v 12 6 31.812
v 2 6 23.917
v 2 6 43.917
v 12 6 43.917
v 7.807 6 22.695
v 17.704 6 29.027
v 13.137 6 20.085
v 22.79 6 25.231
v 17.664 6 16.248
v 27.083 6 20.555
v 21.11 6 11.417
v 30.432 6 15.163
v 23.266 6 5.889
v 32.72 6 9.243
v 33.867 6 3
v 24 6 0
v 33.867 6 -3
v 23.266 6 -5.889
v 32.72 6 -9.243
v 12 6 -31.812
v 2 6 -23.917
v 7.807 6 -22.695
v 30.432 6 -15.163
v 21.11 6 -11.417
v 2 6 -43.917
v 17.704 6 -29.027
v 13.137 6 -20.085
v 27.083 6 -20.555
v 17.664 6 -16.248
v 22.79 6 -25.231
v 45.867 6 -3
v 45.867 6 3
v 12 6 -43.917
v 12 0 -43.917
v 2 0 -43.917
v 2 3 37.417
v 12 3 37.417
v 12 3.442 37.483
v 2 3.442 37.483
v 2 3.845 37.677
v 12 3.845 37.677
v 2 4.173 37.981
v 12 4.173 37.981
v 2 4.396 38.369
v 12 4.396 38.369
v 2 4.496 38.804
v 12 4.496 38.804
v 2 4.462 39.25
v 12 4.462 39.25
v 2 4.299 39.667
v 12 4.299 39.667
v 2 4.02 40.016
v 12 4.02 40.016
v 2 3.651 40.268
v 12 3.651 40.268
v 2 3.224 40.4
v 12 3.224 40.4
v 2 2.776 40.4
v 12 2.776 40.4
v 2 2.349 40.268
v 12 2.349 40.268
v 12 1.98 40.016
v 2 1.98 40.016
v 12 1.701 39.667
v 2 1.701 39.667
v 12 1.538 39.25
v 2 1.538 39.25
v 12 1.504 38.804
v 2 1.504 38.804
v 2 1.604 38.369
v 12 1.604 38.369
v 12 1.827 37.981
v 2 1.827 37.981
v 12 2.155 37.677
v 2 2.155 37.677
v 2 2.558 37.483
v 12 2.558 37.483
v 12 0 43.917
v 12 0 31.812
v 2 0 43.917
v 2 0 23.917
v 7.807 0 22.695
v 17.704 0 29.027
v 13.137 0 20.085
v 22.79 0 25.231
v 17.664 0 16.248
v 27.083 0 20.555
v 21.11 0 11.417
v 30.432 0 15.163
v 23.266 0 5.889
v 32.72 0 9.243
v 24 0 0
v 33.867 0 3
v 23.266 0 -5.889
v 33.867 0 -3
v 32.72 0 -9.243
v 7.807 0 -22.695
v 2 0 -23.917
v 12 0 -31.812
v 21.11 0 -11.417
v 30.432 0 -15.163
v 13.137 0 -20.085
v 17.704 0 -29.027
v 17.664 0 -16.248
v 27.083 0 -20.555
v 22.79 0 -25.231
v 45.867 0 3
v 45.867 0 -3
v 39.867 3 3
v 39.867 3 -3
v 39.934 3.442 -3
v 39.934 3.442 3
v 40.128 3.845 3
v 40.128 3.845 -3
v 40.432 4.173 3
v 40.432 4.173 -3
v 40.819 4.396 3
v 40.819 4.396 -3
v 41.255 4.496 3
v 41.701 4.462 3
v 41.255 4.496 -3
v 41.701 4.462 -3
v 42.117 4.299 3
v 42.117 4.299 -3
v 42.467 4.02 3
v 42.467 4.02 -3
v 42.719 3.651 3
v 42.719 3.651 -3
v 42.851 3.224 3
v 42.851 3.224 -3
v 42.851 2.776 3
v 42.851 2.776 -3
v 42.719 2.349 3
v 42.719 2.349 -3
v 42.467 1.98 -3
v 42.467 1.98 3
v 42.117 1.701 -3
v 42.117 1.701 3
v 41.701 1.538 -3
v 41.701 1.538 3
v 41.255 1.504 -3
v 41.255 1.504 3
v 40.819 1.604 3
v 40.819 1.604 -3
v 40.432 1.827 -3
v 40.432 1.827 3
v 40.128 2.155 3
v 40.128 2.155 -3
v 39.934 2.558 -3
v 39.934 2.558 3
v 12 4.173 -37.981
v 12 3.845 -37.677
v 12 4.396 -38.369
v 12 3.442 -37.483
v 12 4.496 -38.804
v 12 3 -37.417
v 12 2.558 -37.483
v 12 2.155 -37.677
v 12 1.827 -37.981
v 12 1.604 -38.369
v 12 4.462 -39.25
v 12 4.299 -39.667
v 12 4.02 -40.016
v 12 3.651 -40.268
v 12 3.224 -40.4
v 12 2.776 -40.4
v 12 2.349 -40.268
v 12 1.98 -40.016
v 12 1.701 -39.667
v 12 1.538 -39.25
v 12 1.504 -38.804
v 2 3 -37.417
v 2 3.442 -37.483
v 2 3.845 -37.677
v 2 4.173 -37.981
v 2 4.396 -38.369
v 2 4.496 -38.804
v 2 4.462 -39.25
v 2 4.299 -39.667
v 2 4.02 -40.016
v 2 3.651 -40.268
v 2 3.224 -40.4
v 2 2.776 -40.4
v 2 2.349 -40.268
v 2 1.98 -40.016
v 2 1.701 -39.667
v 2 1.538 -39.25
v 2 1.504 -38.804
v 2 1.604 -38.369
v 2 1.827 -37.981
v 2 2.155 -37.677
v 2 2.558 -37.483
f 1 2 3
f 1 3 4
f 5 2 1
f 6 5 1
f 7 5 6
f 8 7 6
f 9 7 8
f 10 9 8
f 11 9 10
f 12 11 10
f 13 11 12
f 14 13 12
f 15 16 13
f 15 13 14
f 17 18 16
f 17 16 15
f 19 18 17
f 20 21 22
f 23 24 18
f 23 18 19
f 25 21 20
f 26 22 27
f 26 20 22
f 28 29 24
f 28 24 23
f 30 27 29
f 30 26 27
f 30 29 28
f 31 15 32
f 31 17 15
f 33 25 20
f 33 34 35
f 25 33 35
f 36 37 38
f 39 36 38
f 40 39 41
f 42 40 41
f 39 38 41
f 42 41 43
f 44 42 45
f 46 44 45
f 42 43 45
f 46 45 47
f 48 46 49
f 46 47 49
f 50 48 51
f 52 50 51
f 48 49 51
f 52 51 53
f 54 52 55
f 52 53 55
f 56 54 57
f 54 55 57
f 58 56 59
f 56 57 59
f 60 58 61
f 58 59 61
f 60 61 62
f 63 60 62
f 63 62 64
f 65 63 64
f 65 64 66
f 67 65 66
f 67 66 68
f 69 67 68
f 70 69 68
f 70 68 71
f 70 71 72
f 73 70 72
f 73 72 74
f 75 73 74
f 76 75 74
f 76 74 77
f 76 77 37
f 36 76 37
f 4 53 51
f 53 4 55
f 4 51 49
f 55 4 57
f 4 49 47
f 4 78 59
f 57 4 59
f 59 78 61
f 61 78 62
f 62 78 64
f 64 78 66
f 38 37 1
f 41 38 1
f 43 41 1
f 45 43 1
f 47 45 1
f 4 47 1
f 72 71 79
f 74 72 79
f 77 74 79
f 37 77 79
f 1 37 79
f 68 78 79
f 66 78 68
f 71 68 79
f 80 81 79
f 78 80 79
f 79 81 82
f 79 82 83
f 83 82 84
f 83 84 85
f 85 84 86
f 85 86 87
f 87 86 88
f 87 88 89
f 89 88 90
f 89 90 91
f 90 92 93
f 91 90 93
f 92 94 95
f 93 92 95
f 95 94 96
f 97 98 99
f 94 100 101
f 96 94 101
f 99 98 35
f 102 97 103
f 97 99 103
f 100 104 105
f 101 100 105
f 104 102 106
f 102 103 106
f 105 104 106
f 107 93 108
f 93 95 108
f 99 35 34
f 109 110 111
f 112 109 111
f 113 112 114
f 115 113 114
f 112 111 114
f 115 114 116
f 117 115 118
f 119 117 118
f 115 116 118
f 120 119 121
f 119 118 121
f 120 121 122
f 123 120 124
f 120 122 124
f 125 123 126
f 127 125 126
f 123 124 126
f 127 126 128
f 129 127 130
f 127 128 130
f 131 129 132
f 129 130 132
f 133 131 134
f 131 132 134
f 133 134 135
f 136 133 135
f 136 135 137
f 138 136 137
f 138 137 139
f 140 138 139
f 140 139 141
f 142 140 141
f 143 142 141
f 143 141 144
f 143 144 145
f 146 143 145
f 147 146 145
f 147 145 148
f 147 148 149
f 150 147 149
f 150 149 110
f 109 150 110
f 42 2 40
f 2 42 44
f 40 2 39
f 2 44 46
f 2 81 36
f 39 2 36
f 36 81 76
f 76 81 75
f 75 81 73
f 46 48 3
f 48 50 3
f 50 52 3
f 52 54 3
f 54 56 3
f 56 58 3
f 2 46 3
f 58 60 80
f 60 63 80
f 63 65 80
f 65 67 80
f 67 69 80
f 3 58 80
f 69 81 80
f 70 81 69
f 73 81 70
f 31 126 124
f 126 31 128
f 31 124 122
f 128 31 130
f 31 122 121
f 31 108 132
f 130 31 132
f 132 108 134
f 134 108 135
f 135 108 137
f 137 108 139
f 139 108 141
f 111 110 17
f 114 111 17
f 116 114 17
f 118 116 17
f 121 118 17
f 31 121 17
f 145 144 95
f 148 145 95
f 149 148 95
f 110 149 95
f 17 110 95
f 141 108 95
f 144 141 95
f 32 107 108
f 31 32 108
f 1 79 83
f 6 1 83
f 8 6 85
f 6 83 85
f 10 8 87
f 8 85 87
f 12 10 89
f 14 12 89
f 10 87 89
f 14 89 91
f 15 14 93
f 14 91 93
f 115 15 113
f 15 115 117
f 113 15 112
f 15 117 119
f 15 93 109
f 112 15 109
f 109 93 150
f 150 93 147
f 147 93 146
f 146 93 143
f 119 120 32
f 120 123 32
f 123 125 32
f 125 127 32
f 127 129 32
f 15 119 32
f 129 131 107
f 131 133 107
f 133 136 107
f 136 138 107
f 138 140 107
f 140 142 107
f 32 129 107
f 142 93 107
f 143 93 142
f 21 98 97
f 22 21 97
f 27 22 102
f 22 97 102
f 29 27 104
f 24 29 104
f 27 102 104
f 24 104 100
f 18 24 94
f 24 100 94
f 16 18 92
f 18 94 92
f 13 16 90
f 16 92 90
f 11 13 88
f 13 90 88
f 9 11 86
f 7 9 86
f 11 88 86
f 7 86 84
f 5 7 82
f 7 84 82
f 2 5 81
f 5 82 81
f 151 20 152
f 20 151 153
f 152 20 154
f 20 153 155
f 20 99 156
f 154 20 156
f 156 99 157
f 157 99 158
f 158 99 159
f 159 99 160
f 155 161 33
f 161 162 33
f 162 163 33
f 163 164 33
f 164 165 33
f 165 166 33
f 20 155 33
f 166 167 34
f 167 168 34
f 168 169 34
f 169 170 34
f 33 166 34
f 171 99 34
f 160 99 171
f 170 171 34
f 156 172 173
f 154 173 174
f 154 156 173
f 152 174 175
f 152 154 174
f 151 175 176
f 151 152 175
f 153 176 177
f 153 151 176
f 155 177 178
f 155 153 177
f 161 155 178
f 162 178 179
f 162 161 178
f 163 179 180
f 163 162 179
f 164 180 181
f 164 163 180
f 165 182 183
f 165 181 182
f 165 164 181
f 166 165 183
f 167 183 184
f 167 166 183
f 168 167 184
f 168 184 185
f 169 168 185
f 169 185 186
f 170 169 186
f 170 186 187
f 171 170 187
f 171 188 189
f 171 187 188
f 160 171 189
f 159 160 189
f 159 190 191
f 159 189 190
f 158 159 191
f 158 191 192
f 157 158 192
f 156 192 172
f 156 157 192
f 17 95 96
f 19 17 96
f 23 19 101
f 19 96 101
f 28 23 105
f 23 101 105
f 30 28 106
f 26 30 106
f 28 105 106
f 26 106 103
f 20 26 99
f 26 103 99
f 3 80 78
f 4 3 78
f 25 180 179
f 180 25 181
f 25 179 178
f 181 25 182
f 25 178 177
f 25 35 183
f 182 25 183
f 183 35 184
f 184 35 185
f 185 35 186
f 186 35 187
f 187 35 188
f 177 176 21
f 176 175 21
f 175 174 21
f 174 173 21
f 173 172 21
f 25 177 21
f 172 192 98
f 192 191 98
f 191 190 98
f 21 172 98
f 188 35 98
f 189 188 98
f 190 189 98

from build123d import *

# Parameters (mm, degrees)
BOSS_EXTRUDE1_DEPTH = 6
SKETCH3_R           = 1.5
CUT_EXTRUDE2_DEPTH  = 47.916521486
SKETCH4_R           = 1.5
CUT_EXTRUDE3_DEPTH  = 11


with BuildPart() as part:
    # Sketch1 → Boss-Extrude1 (new body)
    with BuildSketch(Plane(origin=(0, 0, 0), x_dir=(1, 0, 0), z_dir=(0, 1, 0))):
        with BuildLine():
            Line((2, 43.916521486), (2, 23.916521486))
            ThreePointArc((2, 23.916521486), (24, 0), (2, -23.916521486))
            Line((2, -23.916521486), (2, -43.916521486))
            Line((2, -43.916521486), (12, -43.916521486))
            Line((12, -43.916521486), (12, -31.811947441))
            ThreePointArc((12, -31.811947441), (27.082954224, -20.55513538), (33.867388444, -3))
            Line((33.867388444, -3), (45.867388444, -3))
            Line((45.867388444, -3), (45.867388444, 3))
            Line((45.867388444, 3), (33.867388444, 3))
            ThreePointArc((33.867388444, 3), (27.082954224, 20.55513538), (12, 31.811947441))
            Line((12, 31.811947441), (12, 43.916521486))
            Line((12, 43.916521486), (2, 43.916521486))
        make_face()
    extrude(amount=BOSS_EXTRUDE1_DEPTH)

    # Sketch3 → Cut-Extrude2 (cut, through all)
    with BuildSketch(Plane(origin=(0, 0, -3), x_dir=(-1, 0, 0), z_dir=(0, 0, -1))):
        with Locations((-41.367388444, 3)):
            Circle(SKETCH3_R)
    extrude(amount=-CUT_EXTRUDE2_DEPTH, mode=Mode.SUBTRACT)

    # Sketch4 → Cut-Extrude3 (cut, through all)
    with BuildSketch(Plane(origin=(12, 0, 0), x_dir=(0, 0, -1), z_dir=(1, 0, 0))):
        with Locations((-38.916521486, 3)):
            Circle(SKETCH4_R)
    cut_extrude3 = extrude(amount=-CUT_EXTRUDE3_DEPTH, mode=Mode.SUBTRACT)

    # Mirror1: Cut-Extrude3 across plane
    add(cut_extrude3.mirror(Plane.XY), mode=Mode.SUBTRACT)


solid = part.part
